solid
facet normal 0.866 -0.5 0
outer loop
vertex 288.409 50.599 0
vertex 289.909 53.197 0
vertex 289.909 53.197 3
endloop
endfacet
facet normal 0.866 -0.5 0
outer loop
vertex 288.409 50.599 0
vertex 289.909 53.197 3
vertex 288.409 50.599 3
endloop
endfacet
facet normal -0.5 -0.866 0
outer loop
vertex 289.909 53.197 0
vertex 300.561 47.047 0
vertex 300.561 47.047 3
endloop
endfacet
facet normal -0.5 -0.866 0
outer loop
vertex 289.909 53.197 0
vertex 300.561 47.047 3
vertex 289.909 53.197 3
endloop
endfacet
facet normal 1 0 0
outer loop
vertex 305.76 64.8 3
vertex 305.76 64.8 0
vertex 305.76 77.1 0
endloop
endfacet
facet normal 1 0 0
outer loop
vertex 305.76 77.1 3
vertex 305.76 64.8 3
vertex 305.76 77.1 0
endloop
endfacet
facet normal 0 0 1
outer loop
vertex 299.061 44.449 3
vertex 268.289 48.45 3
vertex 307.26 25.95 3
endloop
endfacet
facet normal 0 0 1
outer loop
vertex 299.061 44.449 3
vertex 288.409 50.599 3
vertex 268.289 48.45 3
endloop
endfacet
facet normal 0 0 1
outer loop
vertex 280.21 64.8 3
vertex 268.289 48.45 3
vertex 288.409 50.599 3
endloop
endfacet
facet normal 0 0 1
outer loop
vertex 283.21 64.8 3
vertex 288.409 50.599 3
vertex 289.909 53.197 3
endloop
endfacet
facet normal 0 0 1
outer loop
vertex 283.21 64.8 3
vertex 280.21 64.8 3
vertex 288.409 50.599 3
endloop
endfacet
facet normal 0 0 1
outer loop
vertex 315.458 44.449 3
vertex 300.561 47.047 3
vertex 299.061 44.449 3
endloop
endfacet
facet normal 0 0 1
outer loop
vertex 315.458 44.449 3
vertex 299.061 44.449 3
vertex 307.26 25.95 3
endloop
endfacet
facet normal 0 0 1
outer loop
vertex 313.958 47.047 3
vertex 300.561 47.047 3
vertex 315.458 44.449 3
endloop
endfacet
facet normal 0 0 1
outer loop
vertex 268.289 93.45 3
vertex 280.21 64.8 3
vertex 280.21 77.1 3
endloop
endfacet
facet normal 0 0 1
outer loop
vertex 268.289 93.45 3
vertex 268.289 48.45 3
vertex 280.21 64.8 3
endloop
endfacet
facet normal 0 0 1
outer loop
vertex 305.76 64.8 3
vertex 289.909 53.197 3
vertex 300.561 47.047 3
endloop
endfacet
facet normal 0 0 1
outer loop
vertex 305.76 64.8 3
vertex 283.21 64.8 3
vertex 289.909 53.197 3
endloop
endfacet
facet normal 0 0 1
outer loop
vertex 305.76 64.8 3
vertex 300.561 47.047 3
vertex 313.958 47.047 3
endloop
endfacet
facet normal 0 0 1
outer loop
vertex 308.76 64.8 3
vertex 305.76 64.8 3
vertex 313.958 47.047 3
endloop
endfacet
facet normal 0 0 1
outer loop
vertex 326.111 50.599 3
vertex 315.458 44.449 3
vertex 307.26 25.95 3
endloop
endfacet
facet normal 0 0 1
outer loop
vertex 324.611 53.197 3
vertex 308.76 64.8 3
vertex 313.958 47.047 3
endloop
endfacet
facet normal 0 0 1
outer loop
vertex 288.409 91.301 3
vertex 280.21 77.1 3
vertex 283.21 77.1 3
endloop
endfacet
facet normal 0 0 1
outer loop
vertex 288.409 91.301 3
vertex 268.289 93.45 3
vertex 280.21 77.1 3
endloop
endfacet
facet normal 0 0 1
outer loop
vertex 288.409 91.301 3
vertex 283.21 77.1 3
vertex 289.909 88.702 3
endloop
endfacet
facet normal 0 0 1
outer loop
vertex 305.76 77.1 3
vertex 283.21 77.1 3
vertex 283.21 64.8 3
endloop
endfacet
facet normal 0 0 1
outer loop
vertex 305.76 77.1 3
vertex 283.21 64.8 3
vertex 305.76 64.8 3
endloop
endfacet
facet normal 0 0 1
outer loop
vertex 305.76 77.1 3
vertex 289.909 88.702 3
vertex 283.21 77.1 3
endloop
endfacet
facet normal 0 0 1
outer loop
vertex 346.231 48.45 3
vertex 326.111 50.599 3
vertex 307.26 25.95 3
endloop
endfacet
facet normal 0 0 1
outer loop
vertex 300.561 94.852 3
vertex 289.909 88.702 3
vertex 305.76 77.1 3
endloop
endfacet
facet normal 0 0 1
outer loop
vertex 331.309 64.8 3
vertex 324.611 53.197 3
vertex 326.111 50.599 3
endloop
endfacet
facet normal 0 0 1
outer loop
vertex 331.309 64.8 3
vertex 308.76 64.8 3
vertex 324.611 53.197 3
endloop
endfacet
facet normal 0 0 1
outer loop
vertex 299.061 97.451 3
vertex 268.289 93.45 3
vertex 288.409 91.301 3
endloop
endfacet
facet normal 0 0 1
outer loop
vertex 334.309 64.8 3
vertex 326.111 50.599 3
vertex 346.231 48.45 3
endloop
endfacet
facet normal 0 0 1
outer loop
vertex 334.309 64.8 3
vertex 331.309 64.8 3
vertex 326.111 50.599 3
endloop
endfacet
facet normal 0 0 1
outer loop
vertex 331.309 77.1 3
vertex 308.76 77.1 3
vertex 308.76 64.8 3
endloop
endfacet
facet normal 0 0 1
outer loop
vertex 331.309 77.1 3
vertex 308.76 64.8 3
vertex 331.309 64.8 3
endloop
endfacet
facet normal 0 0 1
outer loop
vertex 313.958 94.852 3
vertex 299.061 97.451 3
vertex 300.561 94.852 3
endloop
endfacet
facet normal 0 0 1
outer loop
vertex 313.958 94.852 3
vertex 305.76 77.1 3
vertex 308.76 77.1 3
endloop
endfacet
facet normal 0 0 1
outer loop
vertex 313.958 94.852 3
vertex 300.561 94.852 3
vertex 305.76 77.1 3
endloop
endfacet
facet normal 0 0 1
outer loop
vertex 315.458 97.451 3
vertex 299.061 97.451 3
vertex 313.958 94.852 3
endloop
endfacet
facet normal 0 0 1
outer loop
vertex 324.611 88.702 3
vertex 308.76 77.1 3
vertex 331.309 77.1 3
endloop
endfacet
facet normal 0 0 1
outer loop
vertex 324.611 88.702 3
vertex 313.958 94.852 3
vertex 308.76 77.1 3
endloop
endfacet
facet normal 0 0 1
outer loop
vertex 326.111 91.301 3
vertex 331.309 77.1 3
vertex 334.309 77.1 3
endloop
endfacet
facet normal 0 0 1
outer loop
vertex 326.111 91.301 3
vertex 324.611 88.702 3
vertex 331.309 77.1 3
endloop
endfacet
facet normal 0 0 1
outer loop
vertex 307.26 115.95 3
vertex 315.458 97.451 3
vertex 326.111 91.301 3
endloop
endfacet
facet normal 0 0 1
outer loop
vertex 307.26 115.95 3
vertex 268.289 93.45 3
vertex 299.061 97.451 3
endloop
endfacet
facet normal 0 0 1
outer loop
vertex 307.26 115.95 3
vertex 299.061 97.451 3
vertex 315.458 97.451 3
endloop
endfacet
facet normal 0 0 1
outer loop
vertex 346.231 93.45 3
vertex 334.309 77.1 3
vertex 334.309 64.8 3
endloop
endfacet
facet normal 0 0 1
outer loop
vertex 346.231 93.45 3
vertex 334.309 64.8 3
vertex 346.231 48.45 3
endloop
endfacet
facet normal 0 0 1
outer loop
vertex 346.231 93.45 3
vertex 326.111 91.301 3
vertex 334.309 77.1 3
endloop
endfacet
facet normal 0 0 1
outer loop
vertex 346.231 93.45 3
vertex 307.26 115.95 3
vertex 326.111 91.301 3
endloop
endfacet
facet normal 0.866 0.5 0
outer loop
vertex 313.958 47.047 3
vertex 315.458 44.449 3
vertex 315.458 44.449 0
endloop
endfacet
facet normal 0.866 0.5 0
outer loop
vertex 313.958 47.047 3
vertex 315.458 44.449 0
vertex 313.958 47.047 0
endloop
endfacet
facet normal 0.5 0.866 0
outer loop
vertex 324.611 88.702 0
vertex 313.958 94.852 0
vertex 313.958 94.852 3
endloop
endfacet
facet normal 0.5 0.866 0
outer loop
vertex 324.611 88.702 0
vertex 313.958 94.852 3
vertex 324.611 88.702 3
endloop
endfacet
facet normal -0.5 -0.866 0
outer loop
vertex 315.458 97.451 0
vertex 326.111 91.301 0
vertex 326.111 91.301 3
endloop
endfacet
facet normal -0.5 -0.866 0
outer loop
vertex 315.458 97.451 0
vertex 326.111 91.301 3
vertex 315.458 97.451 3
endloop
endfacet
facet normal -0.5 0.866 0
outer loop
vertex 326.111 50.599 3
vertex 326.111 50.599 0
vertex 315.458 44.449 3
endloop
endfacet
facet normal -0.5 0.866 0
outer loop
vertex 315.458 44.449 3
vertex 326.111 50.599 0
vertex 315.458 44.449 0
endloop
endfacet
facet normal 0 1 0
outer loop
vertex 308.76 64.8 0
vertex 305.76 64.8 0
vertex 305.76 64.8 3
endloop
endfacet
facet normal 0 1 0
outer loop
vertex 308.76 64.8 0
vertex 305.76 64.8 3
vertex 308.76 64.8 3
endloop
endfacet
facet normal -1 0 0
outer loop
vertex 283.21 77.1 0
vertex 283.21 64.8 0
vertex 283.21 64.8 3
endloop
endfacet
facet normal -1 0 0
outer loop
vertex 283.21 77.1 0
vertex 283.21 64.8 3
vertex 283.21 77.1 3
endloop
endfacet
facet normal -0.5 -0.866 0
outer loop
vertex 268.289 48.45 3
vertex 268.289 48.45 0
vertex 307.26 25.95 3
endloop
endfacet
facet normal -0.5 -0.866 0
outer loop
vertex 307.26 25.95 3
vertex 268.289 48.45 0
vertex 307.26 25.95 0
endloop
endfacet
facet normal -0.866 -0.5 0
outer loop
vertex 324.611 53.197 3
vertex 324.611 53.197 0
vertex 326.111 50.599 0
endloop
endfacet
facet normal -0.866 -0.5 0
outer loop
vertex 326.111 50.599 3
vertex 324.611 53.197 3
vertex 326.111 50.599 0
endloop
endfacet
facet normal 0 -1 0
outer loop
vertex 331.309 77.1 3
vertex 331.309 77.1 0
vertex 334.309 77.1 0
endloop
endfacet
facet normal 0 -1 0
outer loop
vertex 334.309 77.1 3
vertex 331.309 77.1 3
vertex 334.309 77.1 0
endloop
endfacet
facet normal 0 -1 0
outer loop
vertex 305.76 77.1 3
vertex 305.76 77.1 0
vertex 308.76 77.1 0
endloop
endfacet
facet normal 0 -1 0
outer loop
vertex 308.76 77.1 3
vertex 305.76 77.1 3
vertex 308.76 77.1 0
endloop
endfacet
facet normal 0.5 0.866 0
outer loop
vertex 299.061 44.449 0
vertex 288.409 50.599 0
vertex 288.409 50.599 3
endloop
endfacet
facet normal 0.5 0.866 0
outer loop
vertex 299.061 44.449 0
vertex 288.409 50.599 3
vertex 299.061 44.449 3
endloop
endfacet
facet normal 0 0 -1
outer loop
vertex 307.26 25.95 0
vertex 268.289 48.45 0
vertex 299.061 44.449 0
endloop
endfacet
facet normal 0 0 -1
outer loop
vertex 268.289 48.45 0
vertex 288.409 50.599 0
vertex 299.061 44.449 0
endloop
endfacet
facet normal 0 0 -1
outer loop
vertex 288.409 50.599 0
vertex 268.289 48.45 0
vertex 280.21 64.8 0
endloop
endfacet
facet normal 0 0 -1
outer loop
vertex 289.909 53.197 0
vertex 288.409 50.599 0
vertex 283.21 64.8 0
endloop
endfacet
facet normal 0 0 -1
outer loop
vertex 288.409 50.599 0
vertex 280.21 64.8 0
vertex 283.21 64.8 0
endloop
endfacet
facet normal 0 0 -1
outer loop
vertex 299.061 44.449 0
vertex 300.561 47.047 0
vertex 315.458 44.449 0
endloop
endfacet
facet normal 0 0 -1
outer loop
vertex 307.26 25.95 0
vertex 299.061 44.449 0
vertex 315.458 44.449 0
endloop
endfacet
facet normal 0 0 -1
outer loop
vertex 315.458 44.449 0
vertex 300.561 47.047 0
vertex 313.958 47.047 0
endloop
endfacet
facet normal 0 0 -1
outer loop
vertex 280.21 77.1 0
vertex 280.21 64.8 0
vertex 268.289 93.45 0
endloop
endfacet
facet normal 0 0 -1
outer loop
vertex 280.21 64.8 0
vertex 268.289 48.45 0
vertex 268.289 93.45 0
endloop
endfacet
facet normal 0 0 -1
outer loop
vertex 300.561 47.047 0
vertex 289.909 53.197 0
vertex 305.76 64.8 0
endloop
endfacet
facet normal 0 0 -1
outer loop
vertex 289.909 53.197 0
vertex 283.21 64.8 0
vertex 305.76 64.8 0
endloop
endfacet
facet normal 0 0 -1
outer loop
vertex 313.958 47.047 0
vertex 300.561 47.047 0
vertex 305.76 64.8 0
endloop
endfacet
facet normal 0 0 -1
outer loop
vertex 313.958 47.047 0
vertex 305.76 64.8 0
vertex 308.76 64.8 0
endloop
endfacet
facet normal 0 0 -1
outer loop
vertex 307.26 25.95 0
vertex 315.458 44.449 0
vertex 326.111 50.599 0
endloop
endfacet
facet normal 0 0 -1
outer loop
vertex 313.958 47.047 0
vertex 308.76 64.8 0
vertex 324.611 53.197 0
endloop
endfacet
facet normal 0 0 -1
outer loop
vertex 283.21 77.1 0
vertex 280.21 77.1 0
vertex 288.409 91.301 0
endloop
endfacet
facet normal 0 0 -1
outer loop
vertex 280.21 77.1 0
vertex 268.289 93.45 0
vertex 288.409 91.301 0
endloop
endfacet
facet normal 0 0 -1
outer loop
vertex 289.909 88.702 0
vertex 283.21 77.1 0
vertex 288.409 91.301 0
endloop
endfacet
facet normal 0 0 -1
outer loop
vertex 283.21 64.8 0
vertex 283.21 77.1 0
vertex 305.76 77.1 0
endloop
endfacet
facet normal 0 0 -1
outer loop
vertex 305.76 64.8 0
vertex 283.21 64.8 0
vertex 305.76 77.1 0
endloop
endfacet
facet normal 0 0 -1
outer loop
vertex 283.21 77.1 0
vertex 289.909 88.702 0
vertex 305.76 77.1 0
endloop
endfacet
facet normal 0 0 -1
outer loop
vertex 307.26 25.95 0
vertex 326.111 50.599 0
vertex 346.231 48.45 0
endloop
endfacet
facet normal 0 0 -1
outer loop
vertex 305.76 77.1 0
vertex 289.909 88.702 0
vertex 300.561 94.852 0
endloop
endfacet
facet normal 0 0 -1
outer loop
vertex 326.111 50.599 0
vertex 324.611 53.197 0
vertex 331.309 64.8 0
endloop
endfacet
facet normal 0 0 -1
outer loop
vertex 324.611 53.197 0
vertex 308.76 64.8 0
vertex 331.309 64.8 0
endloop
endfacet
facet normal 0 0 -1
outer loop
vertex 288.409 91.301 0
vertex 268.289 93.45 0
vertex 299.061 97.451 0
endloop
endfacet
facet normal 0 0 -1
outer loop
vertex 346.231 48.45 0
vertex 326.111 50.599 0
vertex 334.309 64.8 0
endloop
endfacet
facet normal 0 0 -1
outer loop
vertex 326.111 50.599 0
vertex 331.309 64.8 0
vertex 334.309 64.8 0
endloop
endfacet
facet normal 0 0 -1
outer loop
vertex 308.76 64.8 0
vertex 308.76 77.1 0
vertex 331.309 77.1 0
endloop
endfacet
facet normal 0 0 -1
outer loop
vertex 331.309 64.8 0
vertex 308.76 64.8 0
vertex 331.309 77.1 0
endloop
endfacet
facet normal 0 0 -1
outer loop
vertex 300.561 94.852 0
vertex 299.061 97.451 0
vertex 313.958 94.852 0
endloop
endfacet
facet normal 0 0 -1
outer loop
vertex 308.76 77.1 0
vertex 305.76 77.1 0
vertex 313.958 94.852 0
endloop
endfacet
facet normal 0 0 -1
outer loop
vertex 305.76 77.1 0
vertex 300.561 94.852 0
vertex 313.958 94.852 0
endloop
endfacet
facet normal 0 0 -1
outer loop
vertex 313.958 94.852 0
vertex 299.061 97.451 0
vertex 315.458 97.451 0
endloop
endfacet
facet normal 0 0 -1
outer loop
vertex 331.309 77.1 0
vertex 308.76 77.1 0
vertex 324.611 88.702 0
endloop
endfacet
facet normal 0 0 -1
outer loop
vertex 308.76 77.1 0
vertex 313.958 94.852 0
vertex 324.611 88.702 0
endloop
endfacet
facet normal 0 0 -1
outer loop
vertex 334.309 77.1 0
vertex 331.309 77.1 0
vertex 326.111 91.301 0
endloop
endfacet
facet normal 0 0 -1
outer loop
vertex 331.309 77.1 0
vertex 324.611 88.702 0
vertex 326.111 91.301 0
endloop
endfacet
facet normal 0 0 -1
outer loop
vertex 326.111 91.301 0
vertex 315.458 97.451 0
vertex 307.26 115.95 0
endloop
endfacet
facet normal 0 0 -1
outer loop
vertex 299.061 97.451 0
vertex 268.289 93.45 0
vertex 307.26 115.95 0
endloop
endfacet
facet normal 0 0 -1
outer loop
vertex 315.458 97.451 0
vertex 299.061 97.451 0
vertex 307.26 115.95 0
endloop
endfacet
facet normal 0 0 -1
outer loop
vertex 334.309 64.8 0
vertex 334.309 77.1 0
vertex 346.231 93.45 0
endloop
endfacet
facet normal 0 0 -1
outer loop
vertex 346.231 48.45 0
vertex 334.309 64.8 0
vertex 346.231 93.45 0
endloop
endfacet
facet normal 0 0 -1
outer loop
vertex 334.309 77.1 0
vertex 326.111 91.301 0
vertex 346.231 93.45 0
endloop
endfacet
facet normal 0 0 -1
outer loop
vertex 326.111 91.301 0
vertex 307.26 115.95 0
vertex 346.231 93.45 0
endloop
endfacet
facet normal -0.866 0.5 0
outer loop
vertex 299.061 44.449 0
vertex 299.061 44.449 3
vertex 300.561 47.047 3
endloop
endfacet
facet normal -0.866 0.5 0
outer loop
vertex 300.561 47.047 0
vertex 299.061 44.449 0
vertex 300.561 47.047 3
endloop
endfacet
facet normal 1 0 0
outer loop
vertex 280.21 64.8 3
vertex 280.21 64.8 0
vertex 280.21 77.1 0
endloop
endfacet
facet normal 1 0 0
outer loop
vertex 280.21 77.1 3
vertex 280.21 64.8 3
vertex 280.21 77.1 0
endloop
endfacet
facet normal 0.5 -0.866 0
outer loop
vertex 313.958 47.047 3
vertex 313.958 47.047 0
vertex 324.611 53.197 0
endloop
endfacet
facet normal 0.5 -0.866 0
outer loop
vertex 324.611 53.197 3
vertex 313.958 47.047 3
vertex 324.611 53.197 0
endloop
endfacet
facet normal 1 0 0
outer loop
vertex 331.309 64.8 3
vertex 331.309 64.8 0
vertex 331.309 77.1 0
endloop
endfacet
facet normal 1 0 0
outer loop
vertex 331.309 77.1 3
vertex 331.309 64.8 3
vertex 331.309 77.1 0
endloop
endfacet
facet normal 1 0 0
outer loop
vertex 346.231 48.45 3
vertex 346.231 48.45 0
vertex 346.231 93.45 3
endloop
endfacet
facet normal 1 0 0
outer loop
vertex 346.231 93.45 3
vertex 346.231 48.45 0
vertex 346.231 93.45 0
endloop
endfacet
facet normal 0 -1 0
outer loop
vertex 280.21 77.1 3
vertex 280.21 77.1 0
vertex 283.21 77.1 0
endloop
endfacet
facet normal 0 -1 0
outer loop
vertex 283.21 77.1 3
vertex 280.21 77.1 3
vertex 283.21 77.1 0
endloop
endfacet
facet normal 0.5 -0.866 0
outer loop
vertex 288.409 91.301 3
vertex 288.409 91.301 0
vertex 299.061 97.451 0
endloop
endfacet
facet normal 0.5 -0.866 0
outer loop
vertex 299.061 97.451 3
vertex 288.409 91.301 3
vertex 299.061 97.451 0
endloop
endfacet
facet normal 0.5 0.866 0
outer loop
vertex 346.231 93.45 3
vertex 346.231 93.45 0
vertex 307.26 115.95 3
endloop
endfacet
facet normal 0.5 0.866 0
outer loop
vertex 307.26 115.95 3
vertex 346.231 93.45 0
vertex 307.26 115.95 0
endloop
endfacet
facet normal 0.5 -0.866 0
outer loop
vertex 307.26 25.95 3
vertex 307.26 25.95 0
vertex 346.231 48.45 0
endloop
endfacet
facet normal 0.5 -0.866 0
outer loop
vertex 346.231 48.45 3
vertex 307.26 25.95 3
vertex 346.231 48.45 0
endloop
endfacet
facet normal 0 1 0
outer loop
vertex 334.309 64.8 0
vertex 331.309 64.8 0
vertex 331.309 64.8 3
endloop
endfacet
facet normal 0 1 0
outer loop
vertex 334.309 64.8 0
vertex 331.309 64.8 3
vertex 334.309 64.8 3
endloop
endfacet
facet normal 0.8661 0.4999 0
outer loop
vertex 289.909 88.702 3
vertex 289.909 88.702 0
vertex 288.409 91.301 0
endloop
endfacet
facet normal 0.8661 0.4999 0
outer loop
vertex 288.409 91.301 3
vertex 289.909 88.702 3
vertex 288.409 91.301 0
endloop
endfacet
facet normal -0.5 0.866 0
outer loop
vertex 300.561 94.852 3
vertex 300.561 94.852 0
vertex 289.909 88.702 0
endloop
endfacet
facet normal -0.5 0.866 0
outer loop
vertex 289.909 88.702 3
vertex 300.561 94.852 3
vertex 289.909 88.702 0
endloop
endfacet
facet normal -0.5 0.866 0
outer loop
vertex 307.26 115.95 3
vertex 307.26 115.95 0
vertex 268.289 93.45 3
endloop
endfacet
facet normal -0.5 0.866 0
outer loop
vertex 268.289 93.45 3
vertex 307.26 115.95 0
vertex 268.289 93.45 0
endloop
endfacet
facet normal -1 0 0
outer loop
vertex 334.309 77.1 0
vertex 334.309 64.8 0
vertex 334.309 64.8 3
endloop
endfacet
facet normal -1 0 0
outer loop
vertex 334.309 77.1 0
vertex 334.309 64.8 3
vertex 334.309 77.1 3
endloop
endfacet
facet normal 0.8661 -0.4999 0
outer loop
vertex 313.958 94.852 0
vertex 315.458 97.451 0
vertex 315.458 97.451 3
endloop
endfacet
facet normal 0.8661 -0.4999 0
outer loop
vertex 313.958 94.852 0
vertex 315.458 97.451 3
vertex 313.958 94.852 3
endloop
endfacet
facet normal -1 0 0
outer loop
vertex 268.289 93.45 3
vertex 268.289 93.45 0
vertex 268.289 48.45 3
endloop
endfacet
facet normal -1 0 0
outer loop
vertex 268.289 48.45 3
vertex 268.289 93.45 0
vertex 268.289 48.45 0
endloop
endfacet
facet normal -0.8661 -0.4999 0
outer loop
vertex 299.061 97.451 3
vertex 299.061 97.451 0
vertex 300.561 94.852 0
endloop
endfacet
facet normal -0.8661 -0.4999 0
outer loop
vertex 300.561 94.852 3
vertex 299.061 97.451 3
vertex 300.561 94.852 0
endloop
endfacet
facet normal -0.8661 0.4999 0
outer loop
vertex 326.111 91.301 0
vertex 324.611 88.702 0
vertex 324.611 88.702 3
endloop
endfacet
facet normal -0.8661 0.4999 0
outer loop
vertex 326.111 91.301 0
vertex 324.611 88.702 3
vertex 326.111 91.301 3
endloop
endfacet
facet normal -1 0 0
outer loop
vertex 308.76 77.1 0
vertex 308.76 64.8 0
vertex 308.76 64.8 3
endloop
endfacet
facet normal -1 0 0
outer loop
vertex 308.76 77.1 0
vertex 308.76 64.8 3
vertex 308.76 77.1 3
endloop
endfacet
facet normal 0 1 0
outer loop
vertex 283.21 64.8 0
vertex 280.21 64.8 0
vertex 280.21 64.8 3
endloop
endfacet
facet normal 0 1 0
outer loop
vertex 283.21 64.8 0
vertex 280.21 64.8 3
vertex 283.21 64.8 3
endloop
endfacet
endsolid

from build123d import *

# Parameters (mm, degrees)
CROQUIS1_W              = 3
CROQUIS1_H              = 12.3
SALIENTE_EXTRUIR1_DEPTH = 3


with BuildPart() as part:
    # Croquis1 → Saliente-Extruir1 (new body)
    with BuildSketch(Plane.XY):
        Polygon((307.259692282, 25.949980259), (346.230835452, 48.449980259), (346.230835452, 93.449980259), (307.259692282, 115.949980259), (268.288549111, 93.449980259), (268.288549111, 48.449980259), align=None)
        with Locations((307.259692282, 70.949980259)):
            Rectangle(CROQUIS1_W, CROQUIS1_H, mode=Mode.SUBTRACT)
        with Locations((332.809217745, 70.949980259)):
            Rectangle(CROQUIS1_W, CROQUIS1_H, mode=Mode.SUBTRACT)
        with Locations((281.710166819, 70.949980259)):
            Rectangle(CROQUIS1_W, CROQUIS1_H, mode=Mode.SUBTRACT)
        Polygon((313.95839878, 94.852480259), (324.610511247, 88.702480259), (326.110511247, 91.30055647), (315.45839878, 97.45055647), align=None, mode=Mode.SUBTRACT)
        Polygon((289.908873317, 88.702480259), (288.408873317, 91.30055647), (299.060985783, 97.45055647), (300.560985783, 94.852480259), align=None, mode=Mode.SUBTRACT)
        Polygon((300.560985783, 47.047480259), (289.908873317, 53.197480259), (288.408873317, 50.599404048), (299.060985783, 44.449404048), align=None, mode=Mode.SUBTRACT)
        Polygon((324.610511247, 53.197480259), (326.110511247, 50.599404048), (315.45839878, 44.449404048), (313.95839878, 47.047480259), align=None, mode=Mode.SUBTRACT)
    extrude(amount=SALIENTE_EXTRUIR1_DEPTH)


solid = part.part
